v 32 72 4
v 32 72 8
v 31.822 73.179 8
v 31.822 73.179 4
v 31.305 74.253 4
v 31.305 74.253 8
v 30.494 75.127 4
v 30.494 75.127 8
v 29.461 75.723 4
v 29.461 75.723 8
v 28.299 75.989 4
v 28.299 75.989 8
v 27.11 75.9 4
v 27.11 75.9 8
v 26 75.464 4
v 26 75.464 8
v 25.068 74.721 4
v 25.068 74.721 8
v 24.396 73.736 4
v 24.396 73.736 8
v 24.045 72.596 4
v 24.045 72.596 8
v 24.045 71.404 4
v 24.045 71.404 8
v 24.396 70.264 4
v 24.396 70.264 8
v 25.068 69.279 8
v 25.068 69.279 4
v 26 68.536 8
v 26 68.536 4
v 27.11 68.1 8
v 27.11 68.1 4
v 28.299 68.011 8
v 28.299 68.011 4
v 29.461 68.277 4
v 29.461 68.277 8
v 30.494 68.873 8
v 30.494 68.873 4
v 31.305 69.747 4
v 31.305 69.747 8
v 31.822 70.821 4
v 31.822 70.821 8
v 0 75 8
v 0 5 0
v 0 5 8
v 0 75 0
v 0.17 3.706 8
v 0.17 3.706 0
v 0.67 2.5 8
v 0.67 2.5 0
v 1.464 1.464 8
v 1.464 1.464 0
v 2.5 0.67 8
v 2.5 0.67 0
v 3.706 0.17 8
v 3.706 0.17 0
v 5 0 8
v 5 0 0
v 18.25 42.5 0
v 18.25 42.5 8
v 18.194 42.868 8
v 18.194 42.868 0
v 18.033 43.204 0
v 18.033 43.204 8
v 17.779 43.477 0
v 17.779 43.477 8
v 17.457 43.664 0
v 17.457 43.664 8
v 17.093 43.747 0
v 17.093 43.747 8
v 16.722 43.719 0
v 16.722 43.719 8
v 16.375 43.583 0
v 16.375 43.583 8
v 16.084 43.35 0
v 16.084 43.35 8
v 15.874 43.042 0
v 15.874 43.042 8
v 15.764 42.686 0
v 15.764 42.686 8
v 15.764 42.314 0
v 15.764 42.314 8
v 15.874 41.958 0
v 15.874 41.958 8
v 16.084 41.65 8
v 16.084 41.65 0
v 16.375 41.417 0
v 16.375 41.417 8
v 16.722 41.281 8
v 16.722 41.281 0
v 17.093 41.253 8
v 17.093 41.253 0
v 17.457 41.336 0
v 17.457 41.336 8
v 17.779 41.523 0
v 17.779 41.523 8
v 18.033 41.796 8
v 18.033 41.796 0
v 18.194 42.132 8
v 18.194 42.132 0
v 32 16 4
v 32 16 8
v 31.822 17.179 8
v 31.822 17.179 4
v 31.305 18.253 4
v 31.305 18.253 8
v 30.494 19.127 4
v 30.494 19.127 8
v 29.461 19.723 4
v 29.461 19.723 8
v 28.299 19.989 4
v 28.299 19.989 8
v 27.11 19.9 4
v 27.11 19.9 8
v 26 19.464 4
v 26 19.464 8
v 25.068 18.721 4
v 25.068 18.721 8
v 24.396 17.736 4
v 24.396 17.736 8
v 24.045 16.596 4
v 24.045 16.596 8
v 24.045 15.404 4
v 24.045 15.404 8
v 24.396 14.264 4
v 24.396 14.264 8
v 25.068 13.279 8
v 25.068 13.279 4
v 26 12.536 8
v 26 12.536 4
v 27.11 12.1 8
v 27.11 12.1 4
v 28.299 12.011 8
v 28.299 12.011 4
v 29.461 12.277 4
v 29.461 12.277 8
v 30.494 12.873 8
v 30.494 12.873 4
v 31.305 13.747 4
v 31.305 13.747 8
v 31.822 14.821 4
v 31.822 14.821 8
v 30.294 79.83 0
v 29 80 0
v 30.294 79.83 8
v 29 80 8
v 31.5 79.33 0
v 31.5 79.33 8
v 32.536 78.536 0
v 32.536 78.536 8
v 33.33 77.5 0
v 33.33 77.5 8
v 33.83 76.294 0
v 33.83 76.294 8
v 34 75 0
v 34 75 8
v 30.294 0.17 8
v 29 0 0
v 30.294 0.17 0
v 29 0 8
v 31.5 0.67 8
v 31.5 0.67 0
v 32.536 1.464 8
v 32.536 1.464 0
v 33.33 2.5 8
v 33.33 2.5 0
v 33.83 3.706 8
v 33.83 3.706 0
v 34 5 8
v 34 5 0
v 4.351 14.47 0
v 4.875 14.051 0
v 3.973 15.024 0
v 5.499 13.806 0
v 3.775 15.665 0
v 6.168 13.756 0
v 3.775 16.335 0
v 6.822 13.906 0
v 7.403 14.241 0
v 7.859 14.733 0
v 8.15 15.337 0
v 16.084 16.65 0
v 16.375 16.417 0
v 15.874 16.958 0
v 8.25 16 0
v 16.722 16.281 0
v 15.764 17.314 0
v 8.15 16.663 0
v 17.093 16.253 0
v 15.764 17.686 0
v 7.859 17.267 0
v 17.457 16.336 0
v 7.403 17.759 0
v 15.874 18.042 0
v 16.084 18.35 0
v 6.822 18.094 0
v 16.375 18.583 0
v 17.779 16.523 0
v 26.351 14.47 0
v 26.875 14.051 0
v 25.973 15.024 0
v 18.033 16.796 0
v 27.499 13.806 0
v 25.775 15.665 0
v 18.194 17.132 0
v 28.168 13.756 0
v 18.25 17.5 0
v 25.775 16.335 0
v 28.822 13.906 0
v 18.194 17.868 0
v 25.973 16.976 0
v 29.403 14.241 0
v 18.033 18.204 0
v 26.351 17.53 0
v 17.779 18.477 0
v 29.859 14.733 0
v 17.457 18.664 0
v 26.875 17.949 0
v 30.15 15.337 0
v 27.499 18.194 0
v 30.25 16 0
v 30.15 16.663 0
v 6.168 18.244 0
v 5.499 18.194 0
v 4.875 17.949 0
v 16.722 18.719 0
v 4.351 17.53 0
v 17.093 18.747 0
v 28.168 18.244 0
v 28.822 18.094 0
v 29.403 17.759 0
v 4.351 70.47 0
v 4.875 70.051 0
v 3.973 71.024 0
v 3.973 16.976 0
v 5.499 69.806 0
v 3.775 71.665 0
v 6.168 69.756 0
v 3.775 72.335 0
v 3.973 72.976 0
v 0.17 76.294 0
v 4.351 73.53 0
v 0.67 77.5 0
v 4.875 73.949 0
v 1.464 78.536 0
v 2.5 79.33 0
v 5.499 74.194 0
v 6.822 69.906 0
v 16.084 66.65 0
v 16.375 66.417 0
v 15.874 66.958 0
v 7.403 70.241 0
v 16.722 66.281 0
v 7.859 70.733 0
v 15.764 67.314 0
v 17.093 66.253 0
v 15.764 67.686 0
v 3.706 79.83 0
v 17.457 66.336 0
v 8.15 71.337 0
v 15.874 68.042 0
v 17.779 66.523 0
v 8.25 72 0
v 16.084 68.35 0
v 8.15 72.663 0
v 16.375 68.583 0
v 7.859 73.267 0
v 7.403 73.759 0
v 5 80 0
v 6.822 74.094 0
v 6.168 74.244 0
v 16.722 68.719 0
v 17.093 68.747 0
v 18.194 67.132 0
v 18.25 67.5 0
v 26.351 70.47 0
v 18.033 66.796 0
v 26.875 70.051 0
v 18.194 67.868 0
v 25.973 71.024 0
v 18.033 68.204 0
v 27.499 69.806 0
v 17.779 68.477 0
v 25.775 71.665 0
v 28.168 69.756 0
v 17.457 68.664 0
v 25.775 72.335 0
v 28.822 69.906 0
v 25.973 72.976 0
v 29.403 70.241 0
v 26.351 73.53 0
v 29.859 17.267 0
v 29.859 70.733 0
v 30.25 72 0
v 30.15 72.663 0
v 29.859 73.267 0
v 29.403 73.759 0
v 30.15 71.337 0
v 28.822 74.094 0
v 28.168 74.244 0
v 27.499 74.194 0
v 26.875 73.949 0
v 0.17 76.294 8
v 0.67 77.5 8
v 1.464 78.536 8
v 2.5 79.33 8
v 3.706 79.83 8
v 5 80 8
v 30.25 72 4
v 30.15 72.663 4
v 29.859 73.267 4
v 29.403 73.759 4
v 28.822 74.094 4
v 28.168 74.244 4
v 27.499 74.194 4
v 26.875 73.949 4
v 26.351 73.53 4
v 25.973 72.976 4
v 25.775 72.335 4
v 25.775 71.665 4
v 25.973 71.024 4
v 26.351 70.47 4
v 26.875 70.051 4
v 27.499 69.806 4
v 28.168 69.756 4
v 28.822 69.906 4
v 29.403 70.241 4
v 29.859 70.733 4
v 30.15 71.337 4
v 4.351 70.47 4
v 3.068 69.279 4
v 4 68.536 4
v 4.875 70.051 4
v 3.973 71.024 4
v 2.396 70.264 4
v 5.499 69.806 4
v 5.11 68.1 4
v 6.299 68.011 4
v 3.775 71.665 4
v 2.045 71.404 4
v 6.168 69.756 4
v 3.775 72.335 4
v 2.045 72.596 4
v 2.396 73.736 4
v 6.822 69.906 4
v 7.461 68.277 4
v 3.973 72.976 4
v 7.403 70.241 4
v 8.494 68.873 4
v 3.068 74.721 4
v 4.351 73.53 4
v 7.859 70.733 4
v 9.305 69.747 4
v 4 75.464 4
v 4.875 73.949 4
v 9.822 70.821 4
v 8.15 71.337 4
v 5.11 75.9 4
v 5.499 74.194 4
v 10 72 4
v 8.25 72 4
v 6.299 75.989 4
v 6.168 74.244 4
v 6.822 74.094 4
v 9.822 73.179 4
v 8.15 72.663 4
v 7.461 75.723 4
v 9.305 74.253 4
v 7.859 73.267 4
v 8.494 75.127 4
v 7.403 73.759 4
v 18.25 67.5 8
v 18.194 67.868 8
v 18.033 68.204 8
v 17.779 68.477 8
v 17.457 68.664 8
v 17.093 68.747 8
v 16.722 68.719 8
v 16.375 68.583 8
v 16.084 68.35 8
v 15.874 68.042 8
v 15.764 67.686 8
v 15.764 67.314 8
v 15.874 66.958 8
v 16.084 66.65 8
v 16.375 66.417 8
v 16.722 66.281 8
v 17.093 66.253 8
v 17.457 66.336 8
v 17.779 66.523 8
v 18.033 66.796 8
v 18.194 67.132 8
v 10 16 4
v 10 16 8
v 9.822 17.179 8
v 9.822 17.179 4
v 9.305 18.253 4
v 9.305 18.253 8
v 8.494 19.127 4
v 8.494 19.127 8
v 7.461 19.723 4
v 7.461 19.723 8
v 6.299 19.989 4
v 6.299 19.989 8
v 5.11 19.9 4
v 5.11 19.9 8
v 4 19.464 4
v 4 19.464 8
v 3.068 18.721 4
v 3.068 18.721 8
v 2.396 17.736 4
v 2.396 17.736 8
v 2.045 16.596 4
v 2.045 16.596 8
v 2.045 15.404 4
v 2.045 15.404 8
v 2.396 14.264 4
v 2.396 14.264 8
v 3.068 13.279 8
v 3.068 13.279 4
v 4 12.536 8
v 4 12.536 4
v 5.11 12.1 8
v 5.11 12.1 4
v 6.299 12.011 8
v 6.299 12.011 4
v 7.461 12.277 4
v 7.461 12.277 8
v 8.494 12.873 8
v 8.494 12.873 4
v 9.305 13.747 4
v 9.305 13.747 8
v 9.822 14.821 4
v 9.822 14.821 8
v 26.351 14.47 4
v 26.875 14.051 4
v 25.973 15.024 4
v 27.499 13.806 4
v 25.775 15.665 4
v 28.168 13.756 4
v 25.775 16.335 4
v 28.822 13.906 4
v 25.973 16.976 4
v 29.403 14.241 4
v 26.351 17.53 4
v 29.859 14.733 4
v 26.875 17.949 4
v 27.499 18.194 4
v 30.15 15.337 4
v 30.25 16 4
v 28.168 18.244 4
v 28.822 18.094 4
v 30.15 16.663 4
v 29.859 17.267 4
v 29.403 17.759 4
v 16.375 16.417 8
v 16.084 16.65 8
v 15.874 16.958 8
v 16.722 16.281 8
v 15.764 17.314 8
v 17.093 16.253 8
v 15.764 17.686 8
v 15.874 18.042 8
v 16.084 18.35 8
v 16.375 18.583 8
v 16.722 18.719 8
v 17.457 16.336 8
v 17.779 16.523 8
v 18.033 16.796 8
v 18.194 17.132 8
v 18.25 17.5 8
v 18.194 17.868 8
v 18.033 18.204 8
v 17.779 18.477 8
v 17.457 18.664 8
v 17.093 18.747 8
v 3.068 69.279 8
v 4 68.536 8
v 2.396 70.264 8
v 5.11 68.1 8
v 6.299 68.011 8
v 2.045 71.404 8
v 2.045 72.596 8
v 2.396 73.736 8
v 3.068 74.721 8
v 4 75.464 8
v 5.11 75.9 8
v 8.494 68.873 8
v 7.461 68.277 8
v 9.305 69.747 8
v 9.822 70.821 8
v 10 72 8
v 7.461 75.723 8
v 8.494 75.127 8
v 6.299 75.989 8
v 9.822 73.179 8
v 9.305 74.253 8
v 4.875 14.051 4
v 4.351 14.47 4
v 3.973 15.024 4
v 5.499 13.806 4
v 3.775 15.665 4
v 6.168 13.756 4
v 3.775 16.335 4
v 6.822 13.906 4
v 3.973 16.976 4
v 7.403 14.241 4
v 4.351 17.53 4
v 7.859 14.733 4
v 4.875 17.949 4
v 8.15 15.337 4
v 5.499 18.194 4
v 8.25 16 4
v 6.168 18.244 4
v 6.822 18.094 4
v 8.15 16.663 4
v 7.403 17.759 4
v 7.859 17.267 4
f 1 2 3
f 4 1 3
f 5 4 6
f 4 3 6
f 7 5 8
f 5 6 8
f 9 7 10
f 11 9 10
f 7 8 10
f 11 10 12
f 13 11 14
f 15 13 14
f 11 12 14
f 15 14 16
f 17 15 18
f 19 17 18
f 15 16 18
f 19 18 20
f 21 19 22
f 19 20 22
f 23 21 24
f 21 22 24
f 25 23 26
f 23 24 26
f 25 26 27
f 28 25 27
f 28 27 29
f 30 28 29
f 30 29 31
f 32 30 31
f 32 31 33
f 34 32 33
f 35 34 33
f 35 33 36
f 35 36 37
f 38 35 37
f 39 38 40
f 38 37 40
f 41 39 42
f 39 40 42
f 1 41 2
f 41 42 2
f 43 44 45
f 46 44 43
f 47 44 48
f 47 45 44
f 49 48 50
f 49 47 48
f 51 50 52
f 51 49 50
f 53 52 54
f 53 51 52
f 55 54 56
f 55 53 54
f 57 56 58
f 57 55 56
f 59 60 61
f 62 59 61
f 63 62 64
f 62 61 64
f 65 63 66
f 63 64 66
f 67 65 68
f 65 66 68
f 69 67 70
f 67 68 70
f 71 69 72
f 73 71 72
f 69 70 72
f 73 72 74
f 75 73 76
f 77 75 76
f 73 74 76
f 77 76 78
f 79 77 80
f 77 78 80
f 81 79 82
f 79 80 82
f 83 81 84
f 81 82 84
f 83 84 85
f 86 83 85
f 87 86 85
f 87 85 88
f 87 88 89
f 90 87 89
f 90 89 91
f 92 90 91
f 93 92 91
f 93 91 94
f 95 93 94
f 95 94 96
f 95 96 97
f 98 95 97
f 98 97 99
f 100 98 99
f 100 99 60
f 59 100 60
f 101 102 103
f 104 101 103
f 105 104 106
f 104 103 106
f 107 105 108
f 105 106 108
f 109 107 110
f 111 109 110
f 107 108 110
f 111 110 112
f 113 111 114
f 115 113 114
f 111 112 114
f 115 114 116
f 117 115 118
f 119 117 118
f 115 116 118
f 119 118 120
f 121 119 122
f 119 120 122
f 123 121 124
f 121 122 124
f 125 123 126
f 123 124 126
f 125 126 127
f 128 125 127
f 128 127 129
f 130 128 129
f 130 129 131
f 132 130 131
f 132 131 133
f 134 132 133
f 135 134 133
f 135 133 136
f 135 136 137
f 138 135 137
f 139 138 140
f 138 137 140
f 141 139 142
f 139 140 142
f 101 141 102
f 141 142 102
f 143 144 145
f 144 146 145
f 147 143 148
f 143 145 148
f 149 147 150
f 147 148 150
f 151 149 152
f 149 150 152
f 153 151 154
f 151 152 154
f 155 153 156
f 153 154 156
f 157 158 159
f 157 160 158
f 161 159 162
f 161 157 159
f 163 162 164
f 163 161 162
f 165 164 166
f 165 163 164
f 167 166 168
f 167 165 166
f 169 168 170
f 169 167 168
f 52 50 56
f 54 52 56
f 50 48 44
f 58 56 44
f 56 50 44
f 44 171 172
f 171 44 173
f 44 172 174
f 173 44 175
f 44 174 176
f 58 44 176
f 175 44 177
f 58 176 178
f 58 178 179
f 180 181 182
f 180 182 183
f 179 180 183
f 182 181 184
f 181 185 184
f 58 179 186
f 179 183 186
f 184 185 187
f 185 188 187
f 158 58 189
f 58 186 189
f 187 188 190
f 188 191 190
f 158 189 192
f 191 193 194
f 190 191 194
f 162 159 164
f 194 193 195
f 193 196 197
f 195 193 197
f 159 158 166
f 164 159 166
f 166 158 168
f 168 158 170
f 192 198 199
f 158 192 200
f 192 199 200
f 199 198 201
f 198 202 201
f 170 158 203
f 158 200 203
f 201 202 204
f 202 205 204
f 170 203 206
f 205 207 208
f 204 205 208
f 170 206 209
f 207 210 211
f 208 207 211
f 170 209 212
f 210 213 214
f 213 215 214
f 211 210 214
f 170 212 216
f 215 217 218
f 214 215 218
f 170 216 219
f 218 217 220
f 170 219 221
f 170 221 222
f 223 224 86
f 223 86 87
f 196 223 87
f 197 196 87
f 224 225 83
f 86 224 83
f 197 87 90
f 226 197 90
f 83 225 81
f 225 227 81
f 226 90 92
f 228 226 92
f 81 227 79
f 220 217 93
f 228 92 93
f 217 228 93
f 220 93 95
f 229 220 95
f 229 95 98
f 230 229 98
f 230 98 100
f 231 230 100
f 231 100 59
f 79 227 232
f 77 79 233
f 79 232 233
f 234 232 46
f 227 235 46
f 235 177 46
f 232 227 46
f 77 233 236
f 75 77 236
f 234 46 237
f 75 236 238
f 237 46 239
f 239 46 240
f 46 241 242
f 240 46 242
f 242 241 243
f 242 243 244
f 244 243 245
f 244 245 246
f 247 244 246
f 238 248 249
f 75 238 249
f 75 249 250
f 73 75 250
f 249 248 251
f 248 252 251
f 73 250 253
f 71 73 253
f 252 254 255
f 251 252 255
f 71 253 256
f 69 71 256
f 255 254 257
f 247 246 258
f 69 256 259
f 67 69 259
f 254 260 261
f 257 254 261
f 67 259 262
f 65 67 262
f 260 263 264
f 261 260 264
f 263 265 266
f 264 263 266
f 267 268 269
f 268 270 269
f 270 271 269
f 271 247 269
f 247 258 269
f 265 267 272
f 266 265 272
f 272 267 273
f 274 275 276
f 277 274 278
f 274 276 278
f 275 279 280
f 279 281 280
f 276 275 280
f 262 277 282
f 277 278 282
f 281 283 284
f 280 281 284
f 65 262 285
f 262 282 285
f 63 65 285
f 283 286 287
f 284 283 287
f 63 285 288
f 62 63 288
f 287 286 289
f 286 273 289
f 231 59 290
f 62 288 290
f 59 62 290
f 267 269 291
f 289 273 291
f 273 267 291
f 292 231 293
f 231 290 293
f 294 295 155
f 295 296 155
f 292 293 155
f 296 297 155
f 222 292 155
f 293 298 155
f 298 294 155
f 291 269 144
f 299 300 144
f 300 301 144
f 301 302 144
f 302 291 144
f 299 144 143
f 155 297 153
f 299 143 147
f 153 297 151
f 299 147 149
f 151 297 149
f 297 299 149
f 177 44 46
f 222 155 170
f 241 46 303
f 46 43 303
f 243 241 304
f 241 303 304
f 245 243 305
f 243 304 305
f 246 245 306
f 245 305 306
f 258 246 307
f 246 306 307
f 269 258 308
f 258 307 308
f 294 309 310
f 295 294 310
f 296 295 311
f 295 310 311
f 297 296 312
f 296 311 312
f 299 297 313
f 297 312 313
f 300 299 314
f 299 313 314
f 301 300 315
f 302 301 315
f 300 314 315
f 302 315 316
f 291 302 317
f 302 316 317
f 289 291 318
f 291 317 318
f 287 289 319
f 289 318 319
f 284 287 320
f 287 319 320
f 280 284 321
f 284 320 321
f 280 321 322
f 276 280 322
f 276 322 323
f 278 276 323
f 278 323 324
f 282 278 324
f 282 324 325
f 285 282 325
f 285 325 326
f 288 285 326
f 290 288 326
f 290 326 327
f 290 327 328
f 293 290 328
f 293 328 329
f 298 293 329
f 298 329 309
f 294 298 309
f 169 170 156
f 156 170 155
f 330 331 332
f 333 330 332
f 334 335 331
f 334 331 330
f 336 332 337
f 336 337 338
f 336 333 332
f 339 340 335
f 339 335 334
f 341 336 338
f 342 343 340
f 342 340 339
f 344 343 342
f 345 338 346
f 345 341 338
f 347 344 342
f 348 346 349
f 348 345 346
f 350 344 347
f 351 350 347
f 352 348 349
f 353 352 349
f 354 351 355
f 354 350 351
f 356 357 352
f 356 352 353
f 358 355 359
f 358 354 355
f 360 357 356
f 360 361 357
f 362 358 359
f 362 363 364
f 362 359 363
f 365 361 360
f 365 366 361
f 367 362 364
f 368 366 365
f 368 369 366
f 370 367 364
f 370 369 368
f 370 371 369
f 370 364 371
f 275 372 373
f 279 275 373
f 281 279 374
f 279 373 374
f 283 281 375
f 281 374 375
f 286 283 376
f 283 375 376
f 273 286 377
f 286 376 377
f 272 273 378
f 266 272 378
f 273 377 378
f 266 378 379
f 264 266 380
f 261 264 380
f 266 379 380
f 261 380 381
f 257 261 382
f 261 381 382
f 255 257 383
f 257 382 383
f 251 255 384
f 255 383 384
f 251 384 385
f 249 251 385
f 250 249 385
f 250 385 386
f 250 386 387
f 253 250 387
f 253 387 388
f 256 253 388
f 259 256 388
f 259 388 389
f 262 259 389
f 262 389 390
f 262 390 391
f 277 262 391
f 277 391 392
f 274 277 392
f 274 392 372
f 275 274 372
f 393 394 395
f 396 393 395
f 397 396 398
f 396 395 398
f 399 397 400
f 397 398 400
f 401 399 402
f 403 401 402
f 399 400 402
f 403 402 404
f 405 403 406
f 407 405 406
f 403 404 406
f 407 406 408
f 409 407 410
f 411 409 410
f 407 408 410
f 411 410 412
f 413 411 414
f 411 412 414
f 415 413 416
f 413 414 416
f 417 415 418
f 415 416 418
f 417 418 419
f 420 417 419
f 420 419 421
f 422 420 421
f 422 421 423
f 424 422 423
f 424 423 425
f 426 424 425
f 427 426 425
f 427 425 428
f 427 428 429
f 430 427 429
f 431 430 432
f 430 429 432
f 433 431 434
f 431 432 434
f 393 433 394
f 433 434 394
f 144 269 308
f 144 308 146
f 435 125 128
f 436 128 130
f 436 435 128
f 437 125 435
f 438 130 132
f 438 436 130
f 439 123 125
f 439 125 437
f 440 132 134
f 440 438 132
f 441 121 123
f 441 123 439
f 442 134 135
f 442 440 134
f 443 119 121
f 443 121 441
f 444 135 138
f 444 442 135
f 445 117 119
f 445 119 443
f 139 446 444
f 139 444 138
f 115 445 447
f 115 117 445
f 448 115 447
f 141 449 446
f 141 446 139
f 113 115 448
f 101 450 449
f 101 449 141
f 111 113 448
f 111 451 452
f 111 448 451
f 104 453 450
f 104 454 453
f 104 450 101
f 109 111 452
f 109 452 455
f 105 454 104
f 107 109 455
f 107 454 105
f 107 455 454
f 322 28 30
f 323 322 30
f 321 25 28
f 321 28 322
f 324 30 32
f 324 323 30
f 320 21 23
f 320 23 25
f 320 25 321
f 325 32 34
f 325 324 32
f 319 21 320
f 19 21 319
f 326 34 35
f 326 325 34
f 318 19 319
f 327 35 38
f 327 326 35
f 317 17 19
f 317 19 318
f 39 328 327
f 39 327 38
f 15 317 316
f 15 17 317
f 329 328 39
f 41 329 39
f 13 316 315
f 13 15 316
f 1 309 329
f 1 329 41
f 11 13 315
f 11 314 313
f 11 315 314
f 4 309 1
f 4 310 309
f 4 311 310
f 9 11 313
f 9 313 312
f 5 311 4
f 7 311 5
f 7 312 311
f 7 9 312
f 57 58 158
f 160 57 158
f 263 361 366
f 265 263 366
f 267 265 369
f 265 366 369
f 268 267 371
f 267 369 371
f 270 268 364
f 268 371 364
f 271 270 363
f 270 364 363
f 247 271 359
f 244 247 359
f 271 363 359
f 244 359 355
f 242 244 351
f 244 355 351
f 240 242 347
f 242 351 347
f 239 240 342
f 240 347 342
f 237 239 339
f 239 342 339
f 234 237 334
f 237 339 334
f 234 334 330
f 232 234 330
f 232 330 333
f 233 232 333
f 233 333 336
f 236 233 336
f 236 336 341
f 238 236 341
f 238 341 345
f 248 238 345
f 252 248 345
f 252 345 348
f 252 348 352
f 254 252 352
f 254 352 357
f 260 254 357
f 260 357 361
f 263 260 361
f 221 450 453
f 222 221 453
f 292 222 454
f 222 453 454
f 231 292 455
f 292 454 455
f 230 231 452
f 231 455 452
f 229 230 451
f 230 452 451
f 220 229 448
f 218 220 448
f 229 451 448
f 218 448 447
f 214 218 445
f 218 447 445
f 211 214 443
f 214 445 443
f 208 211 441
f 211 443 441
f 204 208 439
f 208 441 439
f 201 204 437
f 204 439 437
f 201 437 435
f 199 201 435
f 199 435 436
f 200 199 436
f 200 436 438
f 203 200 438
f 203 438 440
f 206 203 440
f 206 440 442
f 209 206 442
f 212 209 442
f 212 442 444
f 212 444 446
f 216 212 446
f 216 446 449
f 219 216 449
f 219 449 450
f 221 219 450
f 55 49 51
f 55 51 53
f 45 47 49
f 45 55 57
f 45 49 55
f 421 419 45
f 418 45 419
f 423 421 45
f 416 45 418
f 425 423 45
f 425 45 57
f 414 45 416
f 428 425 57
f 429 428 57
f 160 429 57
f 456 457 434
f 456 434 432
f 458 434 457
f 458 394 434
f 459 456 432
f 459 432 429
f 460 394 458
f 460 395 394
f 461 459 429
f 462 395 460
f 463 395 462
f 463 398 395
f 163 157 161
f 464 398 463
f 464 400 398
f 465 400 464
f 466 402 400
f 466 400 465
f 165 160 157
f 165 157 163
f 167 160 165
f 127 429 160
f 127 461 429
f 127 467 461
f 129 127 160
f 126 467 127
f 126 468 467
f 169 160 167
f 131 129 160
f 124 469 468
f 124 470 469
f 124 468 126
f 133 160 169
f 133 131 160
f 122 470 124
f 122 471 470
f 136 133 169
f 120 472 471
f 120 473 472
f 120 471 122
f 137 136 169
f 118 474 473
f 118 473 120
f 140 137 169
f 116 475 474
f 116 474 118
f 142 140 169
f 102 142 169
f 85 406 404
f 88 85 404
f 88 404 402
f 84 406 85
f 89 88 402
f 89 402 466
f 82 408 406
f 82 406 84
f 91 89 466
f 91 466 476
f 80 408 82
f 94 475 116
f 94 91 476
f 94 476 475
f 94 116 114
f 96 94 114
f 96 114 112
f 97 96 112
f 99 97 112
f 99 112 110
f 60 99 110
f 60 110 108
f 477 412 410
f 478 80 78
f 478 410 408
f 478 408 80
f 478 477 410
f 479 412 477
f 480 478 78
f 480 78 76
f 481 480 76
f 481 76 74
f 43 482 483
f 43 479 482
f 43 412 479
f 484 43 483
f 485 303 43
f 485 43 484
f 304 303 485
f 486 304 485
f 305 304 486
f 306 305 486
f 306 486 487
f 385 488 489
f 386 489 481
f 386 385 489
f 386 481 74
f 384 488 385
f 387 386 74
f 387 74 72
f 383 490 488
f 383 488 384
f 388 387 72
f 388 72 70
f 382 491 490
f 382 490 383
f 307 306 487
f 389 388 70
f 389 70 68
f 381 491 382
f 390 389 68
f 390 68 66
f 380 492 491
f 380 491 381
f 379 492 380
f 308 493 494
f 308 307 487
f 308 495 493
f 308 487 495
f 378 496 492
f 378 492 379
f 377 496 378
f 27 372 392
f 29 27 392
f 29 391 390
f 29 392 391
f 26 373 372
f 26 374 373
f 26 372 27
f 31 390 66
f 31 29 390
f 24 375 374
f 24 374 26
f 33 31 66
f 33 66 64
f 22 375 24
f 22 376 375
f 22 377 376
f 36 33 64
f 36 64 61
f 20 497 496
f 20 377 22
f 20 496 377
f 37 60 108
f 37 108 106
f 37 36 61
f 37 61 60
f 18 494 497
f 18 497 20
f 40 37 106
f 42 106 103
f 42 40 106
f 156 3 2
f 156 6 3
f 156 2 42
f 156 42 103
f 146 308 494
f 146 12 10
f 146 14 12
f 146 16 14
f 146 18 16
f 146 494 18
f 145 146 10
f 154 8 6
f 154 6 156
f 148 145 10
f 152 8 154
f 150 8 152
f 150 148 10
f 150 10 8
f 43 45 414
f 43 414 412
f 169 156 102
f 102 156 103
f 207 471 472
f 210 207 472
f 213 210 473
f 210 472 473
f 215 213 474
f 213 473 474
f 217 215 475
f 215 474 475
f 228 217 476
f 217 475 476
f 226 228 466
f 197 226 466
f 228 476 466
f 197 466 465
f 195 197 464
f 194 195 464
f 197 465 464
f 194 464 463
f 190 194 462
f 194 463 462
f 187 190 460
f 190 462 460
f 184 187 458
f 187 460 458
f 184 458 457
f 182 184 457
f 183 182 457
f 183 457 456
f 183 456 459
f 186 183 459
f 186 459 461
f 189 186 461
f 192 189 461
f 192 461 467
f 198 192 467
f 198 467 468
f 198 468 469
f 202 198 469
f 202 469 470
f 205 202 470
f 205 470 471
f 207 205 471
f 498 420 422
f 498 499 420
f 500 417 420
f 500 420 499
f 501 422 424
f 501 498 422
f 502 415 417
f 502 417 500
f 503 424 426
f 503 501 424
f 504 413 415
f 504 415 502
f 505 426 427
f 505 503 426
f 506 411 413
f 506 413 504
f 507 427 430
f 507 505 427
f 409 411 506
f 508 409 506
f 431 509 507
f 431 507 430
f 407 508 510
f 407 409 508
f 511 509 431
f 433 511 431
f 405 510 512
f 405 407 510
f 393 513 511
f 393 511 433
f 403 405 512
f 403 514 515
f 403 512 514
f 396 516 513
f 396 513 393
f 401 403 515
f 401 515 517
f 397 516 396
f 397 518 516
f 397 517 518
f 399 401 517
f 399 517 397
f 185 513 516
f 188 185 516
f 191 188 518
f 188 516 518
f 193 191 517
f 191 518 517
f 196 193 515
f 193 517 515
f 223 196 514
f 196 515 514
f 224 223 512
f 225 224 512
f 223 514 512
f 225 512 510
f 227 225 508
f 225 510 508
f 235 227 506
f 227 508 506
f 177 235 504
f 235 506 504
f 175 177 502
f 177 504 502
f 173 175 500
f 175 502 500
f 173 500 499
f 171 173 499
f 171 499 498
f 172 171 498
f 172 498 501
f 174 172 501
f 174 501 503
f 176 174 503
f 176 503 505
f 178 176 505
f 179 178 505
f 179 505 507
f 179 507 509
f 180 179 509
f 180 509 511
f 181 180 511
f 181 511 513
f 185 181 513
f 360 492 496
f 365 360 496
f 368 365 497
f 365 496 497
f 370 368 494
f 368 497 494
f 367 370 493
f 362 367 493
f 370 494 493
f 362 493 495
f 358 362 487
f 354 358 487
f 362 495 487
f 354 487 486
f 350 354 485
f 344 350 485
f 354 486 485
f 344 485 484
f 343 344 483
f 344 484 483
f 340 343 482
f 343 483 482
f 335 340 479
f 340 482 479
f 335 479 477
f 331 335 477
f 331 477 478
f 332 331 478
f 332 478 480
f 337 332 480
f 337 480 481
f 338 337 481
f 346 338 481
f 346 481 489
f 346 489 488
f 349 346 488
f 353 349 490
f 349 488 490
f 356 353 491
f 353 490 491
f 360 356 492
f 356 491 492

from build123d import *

# Parameters (mm, degrees)
ESQUISSE1_W                  = 34
ESQUISSE1_H                  = 80
BOSS_EXTRU_1_DEPTH           = 8
ESQUISSE2_R                  = 1.25
ENL_V_MAT_EXTRU_1_DEPTH      = 1
ENL_V_MAT_EXTRU_1_DEPTH_BACK = 9
ESQUISSE3_R                  = 2.25
ENL_V_MAT_EXTRU_2_DEPTH      = 1
ENL_V_MAT_EXTRU_2_DEPTH_BACK = 9
ESQUISSE4_R                  = 4
ENL_V_MAT_EXTRU_3_DEPTH      = 4
CONG_1_R                     = 5


with BuildPart() as part:
    # Esquisse1 → Boss.-Extru.1 (new body)
    with BuildSketch(Plane.XY):
        with Locations((17, 40)):
            Rectangle(ESQUISSE1_W, ESQUISSE1_H)
    extrude(amount=BOSS_EXTRU_1_DEPTH)

    # Esquisse2 → Enlèv. mat.-Extru.1 (cut, two sides)
    with BuildSketch(Plane.XY.offset(8)) as enl_v_mat_extru_1_sk:
        with Locations((17, 17.5)):
            Circle(ESQUISSE2_R)
        with Locations((17, 42.5)):
            Circle(ESQUISSE2_R)
        with Locations((17, 67.5)):
            Circle(ESQUISSE2_R)
        with Locations((17, 92.5)):
            Circle(ESQUISSE2_R)
        with Locations((17, 117.5)):
            Circle(ESQUISSE2_R)
        with Locations((17, 142.5)):
            Circle(ESQUISSE2_R)
        with Locations((17, 167.5)):
            Circle(ESQUISSE2_R)
        with Locations((17, 192.5)):
            Circle(ESQUISSE2_R)
    extrude(amount=ENL_V_MAT_EXTRU_1_DEPTH, mode=Mode.SUBTRACT)
    extrude(enl_v_mat_extru_1_sk.sketch, amount=-ENL_V_MAT_EXTRU_1_DEPTH_BACK, mode=Mode.SUBTRACT)

    # Esquisse3 → Enlèv. mat.-Extru.2 (cut, two sides)
    with BuildSketch(Plane.XY.offset(8)) as enl_v_mat_extru_2_sk:
        with Locations((6, 16)):
            Circle(ESQUISSE3_R)
        with Locations((28, 16)):
            Circle(ESQUISSE3_R)
        with Locations((28, 72)):
            Circle(ESQUISSE3_R)
        with Locations((6, 72)):
            Circle(ESQUISSE3_R)
    extrude(amount=ENL_V_MAT_EXTRU_2_DEPTH, mode=Mode.SUBTRACT)
    extrude(enl_v_mat_extru_2_sk.sketch, amount=-ENL_V_MAT_EXTRU_2_DEPTH_BACK, mode=Mode.SUBTRACT)

    # Esquisse4 → Enlèv. mat.-Extru.3 (cut)
    with BuildSketch(Plane.XY.offset(8)):
        with Locations((6, 16)):
            Circle(ESQUISSE4_R)
        with Locations((28, 16)):
            Circle(ESQUISSE4_R)
        with Locations((6, 72)):
            Circle(ESQUISSE4_R)
        with Locations((28, 72)):
            Circle(ESQUISSE4_R)
    extrude(amount=-ENL_V_MAT_EXTRU_3_DEPTH, mode=Mode.SUBTRACT)

    # Congé1
    cong_1_edges = [part.edges().sort_by_distance(p)[0] for p in [
        (0, 80, 4),
        (34, 80, 4),
        (34, 0, 4),
        (0, 0, 4),
    ]]
    fillet(cong_1_edges, radius=CONG_1_R)


solid = part.part
